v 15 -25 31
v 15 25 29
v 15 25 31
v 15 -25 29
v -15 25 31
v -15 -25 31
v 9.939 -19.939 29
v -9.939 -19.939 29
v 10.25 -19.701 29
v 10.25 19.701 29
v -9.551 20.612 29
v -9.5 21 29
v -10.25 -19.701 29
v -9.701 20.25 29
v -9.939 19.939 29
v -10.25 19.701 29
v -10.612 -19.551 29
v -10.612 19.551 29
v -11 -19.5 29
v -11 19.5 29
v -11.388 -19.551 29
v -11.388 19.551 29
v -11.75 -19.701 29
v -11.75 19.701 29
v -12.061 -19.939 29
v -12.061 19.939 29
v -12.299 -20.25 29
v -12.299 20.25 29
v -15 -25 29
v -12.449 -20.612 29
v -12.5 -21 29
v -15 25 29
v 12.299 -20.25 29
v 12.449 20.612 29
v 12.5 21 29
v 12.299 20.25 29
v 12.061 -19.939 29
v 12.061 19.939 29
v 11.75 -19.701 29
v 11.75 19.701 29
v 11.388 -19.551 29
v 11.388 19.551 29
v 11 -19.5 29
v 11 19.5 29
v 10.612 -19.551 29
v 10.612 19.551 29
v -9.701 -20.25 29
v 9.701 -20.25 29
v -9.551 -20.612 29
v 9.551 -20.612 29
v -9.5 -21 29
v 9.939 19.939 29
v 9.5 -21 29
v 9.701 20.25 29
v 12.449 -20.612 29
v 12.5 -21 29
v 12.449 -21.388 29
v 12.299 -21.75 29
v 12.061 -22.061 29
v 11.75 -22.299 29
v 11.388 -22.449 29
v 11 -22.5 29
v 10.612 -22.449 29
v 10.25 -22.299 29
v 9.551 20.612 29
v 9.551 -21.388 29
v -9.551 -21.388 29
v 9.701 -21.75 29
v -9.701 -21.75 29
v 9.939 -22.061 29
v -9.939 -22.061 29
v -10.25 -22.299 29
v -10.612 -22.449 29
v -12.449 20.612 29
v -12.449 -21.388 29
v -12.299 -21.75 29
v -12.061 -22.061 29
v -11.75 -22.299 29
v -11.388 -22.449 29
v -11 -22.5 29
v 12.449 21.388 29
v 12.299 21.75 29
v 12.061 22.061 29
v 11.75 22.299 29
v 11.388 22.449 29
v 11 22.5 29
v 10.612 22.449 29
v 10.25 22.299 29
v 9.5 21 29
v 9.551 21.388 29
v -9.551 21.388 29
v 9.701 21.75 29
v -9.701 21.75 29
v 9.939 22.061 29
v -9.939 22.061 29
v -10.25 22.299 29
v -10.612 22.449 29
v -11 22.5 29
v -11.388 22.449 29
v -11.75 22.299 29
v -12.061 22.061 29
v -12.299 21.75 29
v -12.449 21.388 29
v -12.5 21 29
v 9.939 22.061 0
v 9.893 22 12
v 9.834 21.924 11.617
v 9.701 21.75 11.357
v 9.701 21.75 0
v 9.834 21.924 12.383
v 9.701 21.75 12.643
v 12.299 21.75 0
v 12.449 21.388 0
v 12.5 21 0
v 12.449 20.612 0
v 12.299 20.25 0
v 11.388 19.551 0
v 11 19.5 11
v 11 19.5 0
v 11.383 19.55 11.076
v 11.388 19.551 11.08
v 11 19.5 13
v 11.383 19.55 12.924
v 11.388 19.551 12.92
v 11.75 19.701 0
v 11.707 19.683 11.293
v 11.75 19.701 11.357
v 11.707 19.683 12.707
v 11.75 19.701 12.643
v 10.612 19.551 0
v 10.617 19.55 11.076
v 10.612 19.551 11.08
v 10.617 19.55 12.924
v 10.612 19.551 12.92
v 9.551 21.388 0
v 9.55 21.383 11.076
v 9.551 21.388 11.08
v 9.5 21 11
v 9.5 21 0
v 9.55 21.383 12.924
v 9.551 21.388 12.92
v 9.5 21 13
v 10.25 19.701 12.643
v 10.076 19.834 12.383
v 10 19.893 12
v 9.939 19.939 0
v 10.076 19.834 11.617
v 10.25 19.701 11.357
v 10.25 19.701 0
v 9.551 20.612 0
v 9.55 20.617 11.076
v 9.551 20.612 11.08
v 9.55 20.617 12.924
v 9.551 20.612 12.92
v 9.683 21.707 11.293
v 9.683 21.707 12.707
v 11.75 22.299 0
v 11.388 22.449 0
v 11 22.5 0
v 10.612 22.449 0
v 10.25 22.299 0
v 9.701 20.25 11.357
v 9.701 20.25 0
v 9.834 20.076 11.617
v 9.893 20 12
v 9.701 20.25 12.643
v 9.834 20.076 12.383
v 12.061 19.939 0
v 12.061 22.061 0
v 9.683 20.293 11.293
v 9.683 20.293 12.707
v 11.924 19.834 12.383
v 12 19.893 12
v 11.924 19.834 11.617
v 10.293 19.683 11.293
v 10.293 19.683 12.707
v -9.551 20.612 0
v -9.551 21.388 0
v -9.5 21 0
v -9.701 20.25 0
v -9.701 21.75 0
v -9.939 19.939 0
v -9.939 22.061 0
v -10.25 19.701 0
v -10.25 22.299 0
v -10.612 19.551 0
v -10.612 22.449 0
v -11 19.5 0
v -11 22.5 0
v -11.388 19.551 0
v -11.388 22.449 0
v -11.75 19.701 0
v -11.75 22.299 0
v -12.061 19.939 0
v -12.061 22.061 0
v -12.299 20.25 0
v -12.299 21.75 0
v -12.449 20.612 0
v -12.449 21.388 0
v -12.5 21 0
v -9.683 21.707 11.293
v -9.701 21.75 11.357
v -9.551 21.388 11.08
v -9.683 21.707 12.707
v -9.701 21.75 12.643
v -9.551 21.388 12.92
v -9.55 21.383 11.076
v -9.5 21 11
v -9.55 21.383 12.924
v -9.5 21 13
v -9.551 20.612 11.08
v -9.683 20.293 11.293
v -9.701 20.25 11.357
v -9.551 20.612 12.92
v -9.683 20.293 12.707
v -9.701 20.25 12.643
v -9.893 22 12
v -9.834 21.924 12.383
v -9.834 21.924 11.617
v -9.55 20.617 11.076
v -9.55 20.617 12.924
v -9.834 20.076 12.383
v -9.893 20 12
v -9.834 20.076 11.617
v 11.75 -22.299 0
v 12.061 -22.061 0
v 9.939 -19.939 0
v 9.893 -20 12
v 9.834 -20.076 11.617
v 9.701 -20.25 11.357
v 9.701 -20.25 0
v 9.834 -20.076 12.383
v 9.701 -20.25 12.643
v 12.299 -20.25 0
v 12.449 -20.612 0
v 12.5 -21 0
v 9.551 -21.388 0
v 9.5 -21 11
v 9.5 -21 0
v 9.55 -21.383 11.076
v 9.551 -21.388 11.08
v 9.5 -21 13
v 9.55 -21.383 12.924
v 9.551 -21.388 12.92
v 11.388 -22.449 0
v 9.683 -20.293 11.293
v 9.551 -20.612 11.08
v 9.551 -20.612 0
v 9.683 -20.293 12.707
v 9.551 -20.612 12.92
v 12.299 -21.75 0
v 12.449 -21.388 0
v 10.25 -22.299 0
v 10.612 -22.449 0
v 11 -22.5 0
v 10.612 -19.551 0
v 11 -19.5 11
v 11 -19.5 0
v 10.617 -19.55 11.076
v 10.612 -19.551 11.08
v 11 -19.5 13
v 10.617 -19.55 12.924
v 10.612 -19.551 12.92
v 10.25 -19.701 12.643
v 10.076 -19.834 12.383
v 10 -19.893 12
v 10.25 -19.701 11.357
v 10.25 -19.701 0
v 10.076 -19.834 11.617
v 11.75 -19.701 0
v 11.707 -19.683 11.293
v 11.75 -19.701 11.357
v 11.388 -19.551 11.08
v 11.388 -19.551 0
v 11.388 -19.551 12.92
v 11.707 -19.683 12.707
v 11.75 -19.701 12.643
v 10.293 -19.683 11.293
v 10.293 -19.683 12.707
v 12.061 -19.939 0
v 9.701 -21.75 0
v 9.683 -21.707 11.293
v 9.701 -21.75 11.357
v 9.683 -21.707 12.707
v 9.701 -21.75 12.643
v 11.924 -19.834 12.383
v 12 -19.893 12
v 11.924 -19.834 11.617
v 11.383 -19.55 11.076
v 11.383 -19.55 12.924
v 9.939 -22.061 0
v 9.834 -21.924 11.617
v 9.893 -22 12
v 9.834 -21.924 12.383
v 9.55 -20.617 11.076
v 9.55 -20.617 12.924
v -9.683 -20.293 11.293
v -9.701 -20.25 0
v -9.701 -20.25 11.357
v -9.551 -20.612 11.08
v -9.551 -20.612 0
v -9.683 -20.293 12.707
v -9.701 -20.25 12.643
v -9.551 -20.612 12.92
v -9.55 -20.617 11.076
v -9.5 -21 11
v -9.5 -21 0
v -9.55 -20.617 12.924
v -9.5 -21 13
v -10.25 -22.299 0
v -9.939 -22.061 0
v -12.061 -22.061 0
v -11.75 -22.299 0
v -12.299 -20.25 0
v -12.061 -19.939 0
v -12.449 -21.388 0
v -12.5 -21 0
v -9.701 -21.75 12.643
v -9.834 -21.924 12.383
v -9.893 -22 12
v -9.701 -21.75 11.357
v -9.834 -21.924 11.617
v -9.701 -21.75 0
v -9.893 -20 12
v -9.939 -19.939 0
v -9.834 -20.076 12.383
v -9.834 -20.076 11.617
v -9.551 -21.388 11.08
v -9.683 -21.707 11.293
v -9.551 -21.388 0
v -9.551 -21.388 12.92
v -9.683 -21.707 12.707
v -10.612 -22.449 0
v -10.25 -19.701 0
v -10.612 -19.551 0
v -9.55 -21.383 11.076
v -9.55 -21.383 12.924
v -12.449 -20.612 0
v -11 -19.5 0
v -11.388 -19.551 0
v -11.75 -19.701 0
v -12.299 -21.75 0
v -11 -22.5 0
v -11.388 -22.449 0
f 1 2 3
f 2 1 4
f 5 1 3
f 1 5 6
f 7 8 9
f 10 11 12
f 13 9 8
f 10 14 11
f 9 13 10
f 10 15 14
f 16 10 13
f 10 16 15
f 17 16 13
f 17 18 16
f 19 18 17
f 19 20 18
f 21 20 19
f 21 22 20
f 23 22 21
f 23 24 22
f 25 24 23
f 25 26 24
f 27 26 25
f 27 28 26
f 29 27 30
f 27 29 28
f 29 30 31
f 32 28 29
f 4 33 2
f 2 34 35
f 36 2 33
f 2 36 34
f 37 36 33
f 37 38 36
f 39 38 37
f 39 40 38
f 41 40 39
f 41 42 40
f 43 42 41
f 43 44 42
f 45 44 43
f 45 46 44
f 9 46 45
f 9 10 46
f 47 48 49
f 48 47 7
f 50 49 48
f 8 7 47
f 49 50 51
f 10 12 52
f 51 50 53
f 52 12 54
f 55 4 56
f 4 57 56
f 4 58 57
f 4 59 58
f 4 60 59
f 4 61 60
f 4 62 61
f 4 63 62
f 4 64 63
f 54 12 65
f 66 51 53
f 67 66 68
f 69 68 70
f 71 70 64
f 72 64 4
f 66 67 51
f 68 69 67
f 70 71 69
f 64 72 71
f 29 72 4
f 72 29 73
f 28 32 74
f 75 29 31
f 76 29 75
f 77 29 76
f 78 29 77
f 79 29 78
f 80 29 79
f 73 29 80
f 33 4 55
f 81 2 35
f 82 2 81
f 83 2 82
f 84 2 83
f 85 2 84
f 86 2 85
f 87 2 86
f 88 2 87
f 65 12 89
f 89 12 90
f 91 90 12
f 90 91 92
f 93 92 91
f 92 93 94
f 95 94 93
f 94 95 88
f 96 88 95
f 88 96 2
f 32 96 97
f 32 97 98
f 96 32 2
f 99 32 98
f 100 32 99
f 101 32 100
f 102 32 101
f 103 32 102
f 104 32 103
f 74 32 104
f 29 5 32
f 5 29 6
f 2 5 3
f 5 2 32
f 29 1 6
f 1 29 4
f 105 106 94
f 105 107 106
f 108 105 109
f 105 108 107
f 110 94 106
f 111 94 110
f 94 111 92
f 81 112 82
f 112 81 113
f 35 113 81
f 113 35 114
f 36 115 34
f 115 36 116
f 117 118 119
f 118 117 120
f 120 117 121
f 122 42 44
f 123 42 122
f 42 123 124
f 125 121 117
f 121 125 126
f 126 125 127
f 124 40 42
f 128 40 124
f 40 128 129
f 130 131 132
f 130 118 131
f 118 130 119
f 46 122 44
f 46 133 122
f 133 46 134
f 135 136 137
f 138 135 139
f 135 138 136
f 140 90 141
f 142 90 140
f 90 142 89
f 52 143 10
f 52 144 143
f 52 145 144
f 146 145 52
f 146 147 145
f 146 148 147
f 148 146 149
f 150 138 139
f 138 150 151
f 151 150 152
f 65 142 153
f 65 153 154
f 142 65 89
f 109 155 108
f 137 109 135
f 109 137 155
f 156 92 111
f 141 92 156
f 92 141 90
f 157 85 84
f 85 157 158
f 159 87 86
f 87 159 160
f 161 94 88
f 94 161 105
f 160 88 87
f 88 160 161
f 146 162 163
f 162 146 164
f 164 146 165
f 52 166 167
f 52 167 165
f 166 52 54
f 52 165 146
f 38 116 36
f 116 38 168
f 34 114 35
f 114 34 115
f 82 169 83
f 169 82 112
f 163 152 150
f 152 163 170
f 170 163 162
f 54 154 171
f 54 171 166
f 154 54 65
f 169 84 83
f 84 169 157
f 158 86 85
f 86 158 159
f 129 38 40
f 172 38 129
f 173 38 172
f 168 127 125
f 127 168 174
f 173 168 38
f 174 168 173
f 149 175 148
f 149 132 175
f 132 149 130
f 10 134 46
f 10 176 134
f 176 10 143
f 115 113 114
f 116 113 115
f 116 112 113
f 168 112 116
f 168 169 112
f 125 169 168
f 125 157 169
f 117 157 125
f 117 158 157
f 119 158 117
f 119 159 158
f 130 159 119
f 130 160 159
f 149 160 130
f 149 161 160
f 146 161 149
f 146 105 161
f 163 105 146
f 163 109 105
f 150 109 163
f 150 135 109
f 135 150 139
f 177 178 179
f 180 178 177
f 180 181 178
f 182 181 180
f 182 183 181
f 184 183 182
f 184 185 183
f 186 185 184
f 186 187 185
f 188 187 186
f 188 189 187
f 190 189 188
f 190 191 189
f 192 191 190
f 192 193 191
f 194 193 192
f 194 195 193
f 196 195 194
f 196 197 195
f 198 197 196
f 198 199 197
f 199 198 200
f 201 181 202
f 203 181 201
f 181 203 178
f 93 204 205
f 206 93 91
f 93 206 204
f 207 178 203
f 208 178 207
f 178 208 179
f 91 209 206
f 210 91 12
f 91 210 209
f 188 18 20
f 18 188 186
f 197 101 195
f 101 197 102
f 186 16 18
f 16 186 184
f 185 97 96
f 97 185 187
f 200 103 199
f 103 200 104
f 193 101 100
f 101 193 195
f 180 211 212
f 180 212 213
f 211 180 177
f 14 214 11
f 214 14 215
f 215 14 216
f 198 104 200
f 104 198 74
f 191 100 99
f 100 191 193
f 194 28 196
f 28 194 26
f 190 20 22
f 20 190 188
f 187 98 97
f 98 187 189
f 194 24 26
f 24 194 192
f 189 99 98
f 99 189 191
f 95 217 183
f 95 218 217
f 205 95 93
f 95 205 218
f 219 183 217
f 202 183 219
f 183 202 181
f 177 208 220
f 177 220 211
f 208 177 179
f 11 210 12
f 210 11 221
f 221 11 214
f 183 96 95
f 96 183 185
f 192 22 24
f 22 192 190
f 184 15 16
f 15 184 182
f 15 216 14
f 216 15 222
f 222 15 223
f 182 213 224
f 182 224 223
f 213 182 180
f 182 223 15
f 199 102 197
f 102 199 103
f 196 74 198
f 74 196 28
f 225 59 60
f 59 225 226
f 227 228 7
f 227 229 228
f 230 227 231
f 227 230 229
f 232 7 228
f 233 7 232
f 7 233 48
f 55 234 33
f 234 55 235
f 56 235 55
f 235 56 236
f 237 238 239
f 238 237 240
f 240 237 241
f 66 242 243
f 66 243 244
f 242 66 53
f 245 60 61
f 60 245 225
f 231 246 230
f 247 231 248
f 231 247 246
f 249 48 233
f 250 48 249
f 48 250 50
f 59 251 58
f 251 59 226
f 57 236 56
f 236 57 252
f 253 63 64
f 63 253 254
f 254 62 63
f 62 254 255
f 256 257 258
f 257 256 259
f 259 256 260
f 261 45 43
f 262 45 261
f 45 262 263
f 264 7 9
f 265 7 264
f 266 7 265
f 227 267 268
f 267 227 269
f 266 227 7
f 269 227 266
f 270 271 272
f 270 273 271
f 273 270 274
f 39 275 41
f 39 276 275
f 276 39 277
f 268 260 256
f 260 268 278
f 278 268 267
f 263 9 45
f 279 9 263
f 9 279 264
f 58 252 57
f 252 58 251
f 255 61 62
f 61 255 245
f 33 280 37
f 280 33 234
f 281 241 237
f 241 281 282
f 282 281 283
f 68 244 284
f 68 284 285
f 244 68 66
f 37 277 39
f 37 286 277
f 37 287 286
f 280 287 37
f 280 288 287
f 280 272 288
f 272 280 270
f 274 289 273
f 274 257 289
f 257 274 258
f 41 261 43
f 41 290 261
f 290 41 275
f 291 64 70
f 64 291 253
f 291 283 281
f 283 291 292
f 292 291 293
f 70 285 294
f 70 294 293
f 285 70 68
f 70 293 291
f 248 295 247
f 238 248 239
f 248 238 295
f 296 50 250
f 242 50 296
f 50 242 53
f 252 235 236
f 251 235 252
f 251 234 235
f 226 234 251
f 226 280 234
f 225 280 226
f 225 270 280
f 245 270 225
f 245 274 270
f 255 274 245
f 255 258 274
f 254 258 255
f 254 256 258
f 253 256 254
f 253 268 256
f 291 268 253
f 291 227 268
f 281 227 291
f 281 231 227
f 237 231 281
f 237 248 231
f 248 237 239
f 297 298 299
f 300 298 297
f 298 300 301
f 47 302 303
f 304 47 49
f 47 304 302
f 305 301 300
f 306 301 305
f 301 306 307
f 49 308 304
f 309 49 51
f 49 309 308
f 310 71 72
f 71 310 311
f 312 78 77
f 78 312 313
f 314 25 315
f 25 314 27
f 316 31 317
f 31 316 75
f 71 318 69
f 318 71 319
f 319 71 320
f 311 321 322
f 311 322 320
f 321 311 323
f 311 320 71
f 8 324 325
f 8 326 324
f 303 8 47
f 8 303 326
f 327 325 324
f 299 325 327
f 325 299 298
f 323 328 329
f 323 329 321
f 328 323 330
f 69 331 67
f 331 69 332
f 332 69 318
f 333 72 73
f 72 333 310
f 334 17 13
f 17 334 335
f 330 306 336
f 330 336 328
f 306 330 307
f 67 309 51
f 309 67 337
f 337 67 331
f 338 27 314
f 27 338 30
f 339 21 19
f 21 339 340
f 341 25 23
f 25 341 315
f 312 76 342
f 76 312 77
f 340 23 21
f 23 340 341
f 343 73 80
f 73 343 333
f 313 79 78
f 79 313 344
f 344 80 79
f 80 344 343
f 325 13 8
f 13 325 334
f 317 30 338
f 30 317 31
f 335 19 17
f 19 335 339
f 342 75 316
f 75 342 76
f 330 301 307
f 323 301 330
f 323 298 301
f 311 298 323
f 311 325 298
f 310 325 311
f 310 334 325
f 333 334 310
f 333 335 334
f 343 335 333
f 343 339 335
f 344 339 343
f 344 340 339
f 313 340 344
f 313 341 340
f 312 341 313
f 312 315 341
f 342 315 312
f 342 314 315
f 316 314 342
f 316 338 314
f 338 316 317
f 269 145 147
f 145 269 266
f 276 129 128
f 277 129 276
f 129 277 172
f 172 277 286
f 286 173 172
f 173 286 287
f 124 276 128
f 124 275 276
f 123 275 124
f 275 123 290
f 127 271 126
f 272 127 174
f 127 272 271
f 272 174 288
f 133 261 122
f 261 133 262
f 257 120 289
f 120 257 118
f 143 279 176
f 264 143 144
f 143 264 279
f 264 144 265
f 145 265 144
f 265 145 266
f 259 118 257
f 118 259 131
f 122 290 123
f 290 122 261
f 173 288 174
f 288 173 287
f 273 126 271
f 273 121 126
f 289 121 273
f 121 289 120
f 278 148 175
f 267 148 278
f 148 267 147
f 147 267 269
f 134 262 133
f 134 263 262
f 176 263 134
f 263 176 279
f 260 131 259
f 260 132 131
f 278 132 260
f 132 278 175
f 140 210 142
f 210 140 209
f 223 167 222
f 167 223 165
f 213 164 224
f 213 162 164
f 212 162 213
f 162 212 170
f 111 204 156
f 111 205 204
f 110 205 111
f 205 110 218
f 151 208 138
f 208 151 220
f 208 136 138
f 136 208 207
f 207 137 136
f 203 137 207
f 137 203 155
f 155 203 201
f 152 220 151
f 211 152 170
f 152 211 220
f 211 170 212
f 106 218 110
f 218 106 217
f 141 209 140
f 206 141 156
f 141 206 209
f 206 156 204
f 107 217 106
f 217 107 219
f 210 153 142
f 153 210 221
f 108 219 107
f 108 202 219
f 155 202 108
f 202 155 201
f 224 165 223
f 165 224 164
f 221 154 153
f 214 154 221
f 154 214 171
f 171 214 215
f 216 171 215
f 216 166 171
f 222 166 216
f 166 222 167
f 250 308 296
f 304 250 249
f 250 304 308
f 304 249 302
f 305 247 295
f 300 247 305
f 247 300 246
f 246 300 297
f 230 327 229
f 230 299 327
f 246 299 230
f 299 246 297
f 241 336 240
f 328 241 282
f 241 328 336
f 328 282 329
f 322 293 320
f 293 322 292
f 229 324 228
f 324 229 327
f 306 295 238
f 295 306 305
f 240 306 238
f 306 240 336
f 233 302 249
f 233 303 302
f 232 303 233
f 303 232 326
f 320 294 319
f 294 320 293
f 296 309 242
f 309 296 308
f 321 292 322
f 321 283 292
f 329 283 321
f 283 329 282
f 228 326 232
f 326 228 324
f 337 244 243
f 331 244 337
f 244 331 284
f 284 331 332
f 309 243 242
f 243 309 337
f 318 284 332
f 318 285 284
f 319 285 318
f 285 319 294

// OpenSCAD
$fa = 1;
$fs = 0.4;

overlap=0.001;

// top plate
translate([0, 0, 30])
    cube([30, 50, 2], center=true);

// 4 feet
translate([11, 21, 15.5])
    cylinder(h=31, r=1.5, center=true);
translate([-11, 21, 15.5])
    cylinder(h=31, r=1.5, center=true);
translate([11, -21, 15.5])
    cylinder(h=31, r=1.5, center=true);
translate([-11, -21, 15.5])
    cylinder(h=31, r=1.5, center=true);

// feet bridges
translate([11, 0, 12])
    rotate([90, 0, 0])
    cylinder(h=40, r=1, center=true);
translate([0, 21, 12])
    rotate([0, 90, 0])
    cylinder(h=20, r=1, center=true);
translate([0, -21, 12])
    rotate([0, 90, 0])
    cylinder(h=20, r=1, center=true);
